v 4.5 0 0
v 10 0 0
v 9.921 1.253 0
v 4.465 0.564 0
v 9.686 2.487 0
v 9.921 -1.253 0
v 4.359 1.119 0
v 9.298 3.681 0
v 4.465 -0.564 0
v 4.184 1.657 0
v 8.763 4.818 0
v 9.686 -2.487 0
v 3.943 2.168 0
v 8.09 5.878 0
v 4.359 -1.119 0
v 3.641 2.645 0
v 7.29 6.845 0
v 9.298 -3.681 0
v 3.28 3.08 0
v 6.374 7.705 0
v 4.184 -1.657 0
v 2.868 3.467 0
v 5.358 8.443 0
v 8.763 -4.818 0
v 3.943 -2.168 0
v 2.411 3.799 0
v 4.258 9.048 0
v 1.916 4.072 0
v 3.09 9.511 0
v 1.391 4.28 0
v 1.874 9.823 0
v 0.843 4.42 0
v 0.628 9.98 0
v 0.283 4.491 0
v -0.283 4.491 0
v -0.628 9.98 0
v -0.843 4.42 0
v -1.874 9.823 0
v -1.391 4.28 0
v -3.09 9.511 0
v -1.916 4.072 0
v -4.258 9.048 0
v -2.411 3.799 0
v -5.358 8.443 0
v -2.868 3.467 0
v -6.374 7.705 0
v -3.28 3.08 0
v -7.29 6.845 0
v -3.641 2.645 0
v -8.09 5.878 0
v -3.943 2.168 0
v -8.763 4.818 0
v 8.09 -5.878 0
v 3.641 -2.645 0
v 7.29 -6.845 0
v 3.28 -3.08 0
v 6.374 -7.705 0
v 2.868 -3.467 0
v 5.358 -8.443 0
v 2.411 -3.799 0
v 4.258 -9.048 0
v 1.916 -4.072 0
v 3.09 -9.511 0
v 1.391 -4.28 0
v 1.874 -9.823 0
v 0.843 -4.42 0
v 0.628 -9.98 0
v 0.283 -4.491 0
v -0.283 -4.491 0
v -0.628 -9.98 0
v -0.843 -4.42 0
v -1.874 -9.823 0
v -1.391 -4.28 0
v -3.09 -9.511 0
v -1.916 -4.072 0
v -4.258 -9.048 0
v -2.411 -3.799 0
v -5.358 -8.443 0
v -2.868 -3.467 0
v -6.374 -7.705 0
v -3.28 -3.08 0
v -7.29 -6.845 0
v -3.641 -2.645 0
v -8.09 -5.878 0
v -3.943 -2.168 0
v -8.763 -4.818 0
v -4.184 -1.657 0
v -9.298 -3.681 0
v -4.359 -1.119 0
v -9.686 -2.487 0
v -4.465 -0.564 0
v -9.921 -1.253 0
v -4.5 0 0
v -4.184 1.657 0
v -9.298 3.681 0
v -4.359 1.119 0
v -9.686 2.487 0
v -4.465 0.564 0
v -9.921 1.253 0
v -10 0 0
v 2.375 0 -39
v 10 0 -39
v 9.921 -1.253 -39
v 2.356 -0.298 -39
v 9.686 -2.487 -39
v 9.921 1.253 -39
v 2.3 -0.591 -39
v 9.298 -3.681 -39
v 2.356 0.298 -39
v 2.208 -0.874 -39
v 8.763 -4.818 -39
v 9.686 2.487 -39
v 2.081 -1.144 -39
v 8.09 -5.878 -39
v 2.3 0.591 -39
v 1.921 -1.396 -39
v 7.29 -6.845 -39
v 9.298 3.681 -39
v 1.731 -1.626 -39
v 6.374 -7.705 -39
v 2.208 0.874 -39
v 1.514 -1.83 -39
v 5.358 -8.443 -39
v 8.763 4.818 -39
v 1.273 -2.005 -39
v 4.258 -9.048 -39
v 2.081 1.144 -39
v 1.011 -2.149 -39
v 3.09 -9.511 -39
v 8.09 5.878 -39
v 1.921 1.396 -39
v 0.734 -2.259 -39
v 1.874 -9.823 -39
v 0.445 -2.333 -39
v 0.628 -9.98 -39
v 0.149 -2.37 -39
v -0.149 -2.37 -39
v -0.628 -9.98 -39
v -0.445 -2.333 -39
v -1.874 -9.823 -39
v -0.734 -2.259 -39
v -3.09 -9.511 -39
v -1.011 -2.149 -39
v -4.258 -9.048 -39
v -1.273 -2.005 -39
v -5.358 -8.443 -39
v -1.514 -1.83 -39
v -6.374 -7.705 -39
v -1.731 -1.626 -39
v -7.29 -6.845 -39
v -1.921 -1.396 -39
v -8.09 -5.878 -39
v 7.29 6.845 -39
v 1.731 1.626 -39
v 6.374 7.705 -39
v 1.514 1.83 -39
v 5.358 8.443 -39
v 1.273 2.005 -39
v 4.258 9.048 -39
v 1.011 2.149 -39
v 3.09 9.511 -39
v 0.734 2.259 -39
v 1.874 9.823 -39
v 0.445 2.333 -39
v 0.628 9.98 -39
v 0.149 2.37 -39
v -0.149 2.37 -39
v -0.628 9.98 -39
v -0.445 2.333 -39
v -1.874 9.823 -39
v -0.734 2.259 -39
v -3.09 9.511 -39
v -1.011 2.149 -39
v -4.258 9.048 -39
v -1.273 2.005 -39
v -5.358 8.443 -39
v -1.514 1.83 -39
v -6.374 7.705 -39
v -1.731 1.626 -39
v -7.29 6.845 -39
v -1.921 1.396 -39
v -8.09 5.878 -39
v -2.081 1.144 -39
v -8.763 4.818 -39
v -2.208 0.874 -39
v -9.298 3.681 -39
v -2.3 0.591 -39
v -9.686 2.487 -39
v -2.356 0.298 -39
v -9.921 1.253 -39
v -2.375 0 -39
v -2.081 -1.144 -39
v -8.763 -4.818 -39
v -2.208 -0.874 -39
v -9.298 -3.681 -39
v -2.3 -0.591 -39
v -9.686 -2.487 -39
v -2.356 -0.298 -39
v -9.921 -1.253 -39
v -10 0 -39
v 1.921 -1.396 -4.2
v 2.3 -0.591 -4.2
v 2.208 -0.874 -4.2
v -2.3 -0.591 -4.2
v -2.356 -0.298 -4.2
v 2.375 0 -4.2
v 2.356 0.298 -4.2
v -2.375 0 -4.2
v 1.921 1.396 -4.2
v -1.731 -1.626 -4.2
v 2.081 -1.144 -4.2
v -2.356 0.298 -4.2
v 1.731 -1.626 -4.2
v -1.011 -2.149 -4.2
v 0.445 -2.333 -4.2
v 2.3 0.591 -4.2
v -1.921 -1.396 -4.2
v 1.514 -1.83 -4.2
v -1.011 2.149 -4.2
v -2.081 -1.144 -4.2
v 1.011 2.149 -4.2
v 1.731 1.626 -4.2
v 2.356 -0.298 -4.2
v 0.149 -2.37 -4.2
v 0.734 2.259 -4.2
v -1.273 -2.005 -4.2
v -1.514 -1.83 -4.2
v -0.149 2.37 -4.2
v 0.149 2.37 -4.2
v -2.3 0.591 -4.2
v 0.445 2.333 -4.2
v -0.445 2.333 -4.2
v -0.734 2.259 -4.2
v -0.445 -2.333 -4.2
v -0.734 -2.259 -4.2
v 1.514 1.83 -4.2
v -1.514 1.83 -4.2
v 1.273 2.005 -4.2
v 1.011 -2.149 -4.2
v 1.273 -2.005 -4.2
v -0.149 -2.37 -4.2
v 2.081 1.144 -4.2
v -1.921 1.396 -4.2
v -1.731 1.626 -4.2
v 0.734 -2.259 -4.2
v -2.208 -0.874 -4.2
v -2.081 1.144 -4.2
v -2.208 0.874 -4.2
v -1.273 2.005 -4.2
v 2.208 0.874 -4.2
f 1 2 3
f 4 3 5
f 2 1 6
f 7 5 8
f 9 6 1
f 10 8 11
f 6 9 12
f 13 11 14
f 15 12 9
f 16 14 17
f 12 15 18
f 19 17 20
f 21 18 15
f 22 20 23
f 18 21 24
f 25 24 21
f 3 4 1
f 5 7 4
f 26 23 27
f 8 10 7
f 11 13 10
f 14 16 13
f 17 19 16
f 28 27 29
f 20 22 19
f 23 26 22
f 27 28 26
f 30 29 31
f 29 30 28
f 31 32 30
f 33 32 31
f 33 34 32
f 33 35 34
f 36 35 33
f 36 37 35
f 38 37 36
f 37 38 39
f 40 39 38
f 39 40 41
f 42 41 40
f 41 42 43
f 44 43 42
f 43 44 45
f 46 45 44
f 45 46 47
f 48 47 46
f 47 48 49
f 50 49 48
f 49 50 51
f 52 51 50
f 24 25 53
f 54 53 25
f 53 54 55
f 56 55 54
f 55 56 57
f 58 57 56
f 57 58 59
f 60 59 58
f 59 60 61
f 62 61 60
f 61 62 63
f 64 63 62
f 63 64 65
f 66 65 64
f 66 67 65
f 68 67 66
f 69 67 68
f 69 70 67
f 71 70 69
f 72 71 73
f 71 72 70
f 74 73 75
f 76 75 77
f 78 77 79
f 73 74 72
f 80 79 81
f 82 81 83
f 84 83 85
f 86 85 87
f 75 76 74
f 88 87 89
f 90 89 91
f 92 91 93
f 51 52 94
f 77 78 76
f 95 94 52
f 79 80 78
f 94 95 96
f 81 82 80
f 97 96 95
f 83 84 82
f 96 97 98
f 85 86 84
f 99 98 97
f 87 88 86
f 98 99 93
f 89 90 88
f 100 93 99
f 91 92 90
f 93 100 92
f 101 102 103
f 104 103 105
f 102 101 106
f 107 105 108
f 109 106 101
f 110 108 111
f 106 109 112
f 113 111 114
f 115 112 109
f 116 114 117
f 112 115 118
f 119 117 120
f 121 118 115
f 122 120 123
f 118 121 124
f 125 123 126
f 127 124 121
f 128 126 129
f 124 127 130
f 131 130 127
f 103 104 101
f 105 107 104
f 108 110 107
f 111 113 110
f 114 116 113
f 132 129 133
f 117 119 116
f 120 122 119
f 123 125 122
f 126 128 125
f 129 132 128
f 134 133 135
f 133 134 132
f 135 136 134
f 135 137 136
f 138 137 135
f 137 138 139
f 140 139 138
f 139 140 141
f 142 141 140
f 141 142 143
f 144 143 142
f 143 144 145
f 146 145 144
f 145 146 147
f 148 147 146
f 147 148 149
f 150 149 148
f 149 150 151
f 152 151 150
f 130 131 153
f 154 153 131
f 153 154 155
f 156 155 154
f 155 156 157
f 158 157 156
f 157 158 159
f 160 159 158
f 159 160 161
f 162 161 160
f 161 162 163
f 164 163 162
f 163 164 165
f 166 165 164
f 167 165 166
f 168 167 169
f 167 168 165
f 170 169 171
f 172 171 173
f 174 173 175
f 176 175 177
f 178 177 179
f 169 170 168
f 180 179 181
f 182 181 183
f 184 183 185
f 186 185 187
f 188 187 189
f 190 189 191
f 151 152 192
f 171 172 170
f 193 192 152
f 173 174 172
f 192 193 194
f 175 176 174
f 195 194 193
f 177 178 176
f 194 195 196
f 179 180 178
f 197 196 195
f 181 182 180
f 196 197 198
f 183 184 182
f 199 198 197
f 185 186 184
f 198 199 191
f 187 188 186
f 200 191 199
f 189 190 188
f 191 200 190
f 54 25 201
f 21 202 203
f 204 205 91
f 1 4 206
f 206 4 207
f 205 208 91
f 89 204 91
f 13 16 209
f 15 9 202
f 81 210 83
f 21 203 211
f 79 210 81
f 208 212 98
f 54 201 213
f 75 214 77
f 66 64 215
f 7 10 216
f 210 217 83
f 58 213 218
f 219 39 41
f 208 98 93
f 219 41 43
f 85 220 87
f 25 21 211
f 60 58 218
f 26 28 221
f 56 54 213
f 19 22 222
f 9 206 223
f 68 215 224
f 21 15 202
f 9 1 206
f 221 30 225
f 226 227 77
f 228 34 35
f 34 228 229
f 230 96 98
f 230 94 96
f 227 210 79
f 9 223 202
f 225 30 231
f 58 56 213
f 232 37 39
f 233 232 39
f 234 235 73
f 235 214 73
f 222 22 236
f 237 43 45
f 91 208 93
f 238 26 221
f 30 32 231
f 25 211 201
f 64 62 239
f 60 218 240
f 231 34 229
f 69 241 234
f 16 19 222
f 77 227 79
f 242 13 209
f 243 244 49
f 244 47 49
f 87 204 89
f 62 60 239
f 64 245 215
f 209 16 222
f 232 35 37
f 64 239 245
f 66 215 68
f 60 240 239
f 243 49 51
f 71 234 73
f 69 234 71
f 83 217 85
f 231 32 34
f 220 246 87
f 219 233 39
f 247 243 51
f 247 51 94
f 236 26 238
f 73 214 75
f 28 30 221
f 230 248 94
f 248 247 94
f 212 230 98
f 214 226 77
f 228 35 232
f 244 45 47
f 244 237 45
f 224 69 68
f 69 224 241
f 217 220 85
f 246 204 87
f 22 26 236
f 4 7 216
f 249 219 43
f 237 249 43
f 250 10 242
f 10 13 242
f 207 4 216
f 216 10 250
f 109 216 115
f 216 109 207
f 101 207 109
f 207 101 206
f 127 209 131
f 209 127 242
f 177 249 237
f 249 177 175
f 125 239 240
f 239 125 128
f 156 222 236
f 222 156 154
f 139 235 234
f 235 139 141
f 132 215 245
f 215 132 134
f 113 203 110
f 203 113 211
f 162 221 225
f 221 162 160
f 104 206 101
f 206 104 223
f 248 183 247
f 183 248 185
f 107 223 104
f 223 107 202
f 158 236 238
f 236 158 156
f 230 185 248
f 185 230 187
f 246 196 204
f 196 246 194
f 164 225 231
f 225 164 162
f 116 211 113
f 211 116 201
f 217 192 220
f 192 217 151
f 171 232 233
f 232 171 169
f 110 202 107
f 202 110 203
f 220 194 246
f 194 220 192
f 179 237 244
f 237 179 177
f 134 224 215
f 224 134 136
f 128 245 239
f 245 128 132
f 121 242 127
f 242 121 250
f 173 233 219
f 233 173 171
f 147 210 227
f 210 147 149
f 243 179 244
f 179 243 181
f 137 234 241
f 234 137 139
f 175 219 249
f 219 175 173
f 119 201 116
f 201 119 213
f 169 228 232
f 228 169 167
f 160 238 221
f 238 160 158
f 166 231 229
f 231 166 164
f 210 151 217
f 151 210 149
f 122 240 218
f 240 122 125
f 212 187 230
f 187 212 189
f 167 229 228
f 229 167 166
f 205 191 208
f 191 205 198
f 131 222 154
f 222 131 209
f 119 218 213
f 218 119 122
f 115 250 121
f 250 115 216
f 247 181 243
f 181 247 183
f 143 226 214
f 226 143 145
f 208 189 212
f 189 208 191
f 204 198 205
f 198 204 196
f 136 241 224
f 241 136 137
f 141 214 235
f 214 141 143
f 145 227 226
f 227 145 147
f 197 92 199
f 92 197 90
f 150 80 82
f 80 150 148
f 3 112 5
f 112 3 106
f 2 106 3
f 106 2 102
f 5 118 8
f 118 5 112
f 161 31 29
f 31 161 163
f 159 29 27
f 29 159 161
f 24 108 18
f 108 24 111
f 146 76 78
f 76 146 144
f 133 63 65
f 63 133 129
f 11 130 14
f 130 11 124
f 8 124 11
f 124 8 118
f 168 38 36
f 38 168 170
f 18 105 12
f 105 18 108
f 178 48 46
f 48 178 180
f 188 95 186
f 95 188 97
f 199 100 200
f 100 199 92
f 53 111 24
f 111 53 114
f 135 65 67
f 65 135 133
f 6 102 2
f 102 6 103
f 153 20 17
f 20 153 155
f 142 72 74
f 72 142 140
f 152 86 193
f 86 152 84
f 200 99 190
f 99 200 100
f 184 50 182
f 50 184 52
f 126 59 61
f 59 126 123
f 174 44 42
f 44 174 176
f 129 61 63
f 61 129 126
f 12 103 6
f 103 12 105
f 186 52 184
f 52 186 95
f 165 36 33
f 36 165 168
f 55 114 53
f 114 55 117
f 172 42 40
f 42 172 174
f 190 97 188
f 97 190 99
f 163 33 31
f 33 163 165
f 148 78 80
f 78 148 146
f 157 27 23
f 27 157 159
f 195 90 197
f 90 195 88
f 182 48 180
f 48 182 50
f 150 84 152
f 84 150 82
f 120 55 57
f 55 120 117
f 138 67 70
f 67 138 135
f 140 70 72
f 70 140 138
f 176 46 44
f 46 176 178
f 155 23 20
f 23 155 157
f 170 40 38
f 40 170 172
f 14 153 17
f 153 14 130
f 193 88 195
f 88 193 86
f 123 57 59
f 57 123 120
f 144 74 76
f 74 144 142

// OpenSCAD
$fn = 50;


difference() {
	union() {
		translate(v = [0, 0, -39.0000000000]) {
			cylinder(h = 39, r = 10.0000000000);
		}
		cylinder(h = 0, r = 19.0000000000);
	}
	union() {
		translate(v = [0, 0, 0]) {
			rotate(a = [0, 0, 0]) {
				difference() {
					union() {
						#translate(v = [0, 0, -39.0000000000]) {
							cylinder(h = 39, r = 2.2500000000);
						}
						#translate(v = [0, 0, -4.2000000000]) {
							cylinder(h = 4.2000000000, r = 10.0000000000, r1 = 2.3750000000, r2 = 4.5000000000);
						}
						#translate(v = [0, 0, -39.0000000000]) {
							cylinder(h = 39, r = 2.3750000000);
						}
						#translate(v = [0, 0, -39.0000000000]) {
							cylinder(h = 39, r = 2.2500000000);
						}
					}
					union();
				}
			}
		}
	}
}
